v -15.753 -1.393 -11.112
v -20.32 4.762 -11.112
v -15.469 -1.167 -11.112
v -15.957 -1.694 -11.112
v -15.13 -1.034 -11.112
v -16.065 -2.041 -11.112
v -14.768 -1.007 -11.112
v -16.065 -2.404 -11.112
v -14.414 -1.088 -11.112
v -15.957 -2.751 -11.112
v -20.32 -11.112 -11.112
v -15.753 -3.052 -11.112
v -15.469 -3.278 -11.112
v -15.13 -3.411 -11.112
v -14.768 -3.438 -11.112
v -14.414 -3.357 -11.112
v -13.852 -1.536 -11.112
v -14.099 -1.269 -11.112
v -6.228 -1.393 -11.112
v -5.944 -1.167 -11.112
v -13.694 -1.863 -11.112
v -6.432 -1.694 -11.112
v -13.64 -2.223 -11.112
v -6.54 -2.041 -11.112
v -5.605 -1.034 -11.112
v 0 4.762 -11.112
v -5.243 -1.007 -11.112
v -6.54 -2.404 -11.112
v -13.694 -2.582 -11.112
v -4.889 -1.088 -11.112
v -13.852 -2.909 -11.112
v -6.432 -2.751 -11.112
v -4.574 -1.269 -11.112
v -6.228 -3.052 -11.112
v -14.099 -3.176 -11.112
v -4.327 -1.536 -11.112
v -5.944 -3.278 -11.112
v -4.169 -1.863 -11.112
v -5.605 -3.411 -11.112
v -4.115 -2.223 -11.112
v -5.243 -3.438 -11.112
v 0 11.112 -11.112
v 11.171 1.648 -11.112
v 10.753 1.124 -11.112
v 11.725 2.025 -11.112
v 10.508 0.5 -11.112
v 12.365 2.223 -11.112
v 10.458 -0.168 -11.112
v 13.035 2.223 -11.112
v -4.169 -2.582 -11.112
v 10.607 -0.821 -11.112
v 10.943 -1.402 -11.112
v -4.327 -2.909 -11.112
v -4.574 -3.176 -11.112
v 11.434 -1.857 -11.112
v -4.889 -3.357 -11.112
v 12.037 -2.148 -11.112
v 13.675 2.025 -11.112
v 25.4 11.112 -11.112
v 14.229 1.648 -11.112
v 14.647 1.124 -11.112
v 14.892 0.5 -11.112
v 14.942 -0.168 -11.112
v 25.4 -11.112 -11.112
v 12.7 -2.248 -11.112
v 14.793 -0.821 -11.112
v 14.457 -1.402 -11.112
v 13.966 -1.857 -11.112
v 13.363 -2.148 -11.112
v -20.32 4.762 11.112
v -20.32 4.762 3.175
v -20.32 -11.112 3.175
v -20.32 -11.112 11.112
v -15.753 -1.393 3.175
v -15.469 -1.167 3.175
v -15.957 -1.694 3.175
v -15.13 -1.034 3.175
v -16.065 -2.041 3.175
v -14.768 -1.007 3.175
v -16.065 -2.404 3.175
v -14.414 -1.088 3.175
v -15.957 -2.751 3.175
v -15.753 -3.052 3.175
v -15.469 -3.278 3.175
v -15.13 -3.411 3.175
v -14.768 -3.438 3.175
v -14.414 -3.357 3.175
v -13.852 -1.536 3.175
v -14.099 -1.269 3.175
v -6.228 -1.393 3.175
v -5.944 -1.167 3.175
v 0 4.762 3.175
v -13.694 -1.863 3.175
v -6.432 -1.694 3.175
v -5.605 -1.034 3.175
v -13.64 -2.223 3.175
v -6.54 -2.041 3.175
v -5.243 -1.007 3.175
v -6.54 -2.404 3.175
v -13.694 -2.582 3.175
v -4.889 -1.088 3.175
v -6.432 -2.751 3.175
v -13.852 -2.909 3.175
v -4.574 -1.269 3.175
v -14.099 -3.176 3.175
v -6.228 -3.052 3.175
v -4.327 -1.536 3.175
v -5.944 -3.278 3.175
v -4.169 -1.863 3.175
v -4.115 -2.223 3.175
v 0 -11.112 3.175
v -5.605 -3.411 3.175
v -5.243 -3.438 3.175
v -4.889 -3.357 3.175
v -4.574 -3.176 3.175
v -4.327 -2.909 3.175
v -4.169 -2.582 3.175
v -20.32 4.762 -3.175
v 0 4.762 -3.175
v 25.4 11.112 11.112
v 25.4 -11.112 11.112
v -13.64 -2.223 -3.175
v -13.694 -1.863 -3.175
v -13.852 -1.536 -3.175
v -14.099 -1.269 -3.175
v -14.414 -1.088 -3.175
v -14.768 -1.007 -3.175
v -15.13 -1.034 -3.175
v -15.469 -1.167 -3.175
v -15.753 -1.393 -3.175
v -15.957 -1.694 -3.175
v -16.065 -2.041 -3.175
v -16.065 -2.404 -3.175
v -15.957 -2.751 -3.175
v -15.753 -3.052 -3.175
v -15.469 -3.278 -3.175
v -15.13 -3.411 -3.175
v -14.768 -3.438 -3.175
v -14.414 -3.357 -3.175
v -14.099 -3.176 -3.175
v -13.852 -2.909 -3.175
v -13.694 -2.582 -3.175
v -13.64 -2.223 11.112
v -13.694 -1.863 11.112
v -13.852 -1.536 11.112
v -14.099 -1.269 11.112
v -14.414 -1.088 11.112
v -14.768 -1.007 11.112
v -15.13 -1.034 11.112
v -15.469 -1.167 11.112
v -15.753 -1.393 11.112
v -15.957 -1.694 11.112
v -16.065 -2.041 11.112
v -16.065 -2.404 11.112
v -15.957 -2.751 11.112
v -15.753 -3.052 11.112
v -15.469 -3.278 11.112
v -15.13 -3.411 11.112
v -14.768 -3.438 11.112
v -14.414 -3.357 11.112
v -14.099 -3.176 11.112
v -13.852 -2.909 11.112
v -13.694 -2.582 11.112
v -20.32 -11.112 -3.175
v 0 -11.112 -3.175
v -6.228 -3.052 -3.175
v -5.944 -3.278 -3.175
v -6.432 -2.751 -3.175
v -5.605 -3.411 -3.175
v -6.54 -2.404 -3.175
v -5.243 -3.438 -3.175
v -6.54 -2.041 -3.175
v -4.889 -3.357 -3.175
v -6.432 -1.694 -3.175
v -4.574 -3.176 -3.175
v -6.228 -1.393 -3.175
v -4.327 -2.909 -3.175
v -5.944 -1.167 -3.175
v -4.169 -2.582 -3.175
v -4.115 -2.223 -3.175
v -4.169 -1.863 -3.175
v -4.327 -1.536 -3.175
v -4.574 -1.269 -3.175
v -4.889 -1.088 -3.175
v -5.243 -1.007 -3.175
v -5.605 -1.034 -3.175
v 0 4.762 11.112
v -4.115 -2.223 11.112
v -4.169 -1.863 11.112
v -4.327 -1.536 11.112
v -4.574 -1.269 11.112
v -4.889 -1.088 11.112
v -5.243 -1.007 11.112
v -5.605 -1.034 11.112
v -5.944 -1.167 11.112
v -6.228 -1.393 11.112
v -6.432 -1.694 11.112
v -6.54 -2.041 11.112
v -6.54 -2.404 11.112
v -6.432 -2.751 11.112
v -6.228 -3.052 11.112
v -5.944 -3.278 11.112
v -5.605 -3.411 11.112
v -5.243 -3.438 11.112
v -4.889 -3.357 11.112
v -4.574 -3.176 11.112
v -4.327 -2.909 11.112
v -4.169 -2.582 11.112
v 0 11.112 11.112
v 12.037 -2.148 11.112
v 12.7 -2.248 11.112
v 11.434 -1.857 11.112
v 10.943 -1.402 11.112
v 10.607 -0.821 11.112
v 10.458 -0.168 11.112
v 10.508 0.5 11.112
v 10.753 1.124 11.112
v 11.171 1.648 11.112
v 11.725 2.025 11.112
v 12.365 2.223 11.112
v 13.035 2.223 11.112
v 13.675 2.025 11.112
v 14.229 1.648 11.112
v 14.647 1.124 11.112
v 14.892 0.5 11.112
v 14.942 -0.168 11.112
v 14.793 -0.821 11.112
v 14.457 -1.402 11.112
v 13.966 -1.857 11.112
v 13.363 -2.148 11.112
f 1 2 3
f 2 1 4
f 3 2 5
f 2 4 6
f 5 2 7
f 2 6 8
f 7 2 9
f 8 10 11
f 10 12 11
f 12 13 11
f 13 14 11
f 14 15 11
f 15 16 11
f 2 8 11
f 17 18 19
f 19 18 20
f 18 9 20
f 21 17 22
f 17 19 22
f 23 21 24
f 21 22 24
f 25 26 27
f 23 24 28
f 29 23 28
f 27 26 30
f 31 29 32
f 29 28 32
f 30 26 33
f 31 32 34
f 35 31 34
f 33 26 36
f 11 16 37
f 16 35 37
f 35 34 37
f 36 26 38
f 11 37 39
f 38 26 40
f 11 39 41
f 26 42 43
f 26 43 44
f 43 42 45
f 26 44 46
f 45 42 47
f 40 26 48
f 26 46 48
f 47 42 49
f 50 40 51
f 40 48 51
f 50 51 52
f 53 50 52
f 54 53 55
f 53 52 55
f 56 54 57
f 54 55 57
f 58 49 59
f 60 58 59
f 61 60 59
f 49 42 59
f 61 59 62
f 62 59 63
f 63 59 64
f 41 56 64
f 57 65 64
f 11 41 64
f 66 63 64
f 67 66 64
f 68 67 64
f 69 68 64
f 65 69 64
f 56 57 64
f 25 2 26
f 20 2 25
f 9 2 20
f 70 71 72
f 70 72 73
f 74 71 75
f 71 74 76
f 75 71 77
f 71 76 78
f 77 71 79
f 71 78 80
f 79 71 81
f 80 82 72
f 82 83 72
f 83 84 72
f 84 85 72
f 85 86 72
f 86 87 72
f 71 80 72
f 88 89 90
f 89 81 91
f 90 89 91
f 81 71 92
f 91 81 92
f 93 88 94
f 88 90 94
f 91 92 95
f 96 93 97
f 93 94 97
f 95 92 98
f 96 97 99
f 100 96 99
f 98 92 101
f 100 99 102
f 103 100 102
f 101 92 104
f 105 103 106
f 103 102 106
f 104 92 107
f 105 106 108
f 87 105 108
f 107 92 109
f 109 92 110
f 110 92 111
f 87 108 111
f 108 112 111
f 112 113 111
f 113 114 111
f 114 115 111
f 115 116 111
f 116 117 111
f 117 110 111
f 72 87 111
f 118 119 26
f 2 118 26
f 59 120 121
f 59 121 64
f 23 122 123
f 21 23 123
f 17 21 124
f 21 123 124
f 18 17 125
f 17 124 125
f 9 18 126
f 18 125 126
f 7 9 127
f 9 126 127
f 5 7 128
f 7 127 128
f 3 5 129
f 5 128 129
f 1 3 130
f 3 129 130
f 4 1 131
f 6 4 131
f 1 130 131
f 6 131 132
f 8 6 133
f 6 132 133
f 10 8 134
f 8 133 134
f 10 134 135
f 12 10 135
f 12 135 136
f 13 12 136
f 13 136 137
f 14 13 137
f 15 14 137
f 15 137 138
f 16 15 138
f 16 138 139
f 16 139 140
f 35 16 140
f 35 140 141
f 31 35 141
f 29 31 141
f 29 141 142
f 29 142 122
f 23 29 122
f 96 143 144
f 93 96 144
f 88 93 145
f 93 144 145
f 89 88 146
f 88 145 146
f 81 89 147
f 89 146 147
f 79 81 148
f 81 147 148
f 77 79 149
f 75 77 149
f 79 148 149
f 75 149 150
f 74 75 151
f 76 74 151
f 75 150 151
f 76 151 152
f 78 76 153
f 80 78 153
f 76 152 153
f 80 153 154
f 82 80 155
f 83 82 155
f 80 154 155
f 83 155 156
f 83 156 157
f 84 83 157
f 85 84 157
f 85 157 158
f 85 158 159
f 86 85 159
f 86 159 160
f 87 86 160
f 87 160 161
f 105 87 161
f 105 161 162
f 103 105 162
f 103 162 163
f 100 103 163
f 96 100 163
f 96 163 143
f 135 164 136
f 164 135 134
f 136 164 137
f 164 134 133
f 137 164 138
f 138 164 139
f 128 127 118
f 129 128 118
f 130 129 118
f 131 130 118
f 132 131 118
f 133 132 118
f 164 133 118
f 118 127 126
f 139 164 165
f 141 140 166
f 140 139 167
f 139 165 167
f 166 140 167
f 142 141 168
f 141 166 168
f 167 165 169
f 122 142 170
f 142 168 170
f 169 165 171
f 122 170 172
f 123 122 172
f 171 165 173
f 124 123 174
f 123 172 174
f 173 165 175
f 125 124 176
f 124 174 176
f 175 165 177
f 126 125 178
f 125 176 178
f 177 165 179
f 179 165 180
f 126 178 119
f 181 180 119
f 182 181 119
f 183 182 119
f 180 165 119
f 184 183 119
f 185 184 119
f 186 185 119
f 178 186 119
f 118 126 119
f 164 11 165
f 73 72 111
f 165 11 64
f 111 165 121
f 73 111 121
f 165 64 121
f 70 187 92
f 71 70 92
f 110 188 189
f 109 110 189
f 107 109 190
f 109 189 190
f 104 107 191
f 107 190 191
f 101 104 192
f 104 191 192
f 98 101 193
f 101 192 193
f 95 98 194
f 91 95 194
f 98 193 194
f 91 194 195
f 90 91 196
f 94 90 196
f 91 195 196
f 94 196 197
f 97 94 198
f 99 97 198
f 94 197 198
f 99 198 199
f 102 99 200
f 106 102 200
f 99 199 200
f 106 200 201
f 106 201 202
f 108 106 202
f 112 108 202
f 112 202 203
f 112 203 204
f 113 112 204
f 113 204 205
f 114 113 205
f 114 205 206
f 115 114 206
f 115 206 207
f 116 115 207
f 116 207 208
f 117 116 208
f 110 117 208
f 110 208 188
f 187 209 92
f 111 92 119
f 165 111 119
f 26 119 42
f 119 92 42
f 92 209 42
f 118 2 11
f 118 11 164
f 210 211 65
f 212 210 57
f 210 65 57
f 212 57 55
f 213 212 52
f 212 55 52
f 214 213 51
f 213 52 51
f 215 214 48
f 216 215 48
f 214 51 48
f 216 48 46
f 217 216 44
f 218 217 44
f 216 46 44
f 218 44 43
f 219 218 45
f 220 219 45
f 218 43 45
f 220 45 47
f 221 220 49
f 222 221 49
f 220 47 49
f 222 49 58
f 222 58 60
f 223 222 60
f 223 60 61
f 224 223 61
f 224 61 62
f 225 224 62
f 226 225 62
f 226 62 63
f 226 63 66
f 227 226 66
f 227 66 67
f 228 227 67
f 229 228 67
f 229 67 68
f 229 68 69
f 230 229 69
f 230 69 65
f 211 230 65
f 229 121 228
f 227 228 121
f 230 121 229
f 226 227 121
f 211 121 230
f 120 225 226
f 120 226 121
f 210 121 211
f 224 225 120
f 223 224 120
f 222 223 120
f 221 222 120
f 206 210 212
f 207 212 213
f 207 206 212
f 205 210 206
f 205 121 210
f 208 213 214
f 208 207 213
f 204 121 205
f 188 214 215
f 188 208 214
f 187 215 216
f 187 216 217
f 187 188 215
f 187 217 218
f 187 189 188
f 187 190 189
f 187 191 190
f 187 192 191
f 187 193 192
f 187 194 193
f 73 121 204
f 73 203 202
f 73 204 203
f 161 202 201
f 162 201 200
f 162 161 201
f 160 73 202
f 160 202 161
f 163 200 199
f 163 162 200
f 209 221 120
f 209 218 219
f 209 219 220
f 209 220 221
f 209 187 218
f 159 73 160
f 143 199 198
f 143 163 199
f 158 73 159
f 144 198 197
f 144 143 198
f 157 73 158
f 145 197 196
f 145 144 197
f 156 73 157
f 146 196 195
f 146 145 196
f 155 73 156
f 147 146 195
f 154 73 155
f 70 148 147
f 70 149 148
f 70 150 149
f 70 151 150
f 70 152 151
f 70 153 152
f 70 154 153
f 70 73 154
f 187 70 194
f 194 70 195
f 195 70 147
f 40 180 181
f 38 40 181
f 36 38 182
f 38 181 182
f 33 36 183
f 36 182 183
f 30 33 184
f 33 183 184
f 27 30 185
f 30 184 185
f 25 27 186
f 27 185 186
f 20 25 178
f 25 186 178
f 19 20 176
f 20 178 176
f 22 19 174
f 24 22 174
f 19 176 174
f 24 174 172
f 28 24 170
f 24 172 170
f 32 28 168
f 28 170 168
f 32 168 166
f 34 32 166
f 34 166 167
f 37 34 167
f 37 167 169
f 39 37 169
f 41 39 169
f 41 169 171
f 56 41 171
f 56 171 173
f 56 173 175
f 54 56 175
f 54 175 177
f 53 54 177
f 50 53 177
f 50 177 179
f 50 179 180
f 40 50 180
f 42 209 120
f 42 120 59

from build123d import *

# Parameters (mm, degrees)
SKETCH1_W             = 22.225
SKETCH1_H             = 22.225
BOSS_EXTRUDE1_DEPTH   = 25.4
F_8_CLEARANCE_HOLE1_D = 4.4958
BOSS_EXTRUDE2_DEPTH   = 20.32
F_2_CLEARANCE_HOLE1_D = 2.4384


with BuildPart() as part:
    # Sketch1 → Boss-Extrude1 (new body)
    with BuildSketch(Plane(origin=(0, 0, 0), x_dir=(0, 0, -1), z_dir=(1, 0, 0))):
        Rectangle(SKETCH1_W, SKETCH1_H)
    extrude(amount=BOSS_EXTRUDE1_DEPTH)

    # #8 Clearance Hole1 (through all)
    with Locations(Plane(origin=(12.7, 0, 11.1125), x_dir=(0, 1, 0), z_dir=(0, 0, 1))):
        with Locations((0, 0)):
            Hole(F_8_CLEARANCE_HOLE1_D / 2)

    # Sketch3 → Boss-Extrude2 (add)
    with BuildSketch(Plane.ZY):
        Polygon((-3.175, -11.1125), (-3.175, -4.7625), (-3.175, 4.7625), (-11.1125, 4.7625), (-11.1125, -11.1125), align=None)
        Polygon((3.175, 4.7625), (3.175, -4.7625), (3.175, -11.1125), (11.1125, -11.1125), (11.1125, 4.7625), align=None)
    extrude(amount=BOSS_EXTRUDE2_DEPTH)

    # #2 Clearance Hole1 (through all)
    with Locations(Plane(origin=(0, 0, -11.1125), x_dir=(-1, 0, 0), z_dir=(0, 0, -1))):
        with Locations((5.334, -2.2225), (14.859, -2.2225)):
            Hole(F_2_CLEARANCE_HOLE1_D / 2)


solid = part.part
